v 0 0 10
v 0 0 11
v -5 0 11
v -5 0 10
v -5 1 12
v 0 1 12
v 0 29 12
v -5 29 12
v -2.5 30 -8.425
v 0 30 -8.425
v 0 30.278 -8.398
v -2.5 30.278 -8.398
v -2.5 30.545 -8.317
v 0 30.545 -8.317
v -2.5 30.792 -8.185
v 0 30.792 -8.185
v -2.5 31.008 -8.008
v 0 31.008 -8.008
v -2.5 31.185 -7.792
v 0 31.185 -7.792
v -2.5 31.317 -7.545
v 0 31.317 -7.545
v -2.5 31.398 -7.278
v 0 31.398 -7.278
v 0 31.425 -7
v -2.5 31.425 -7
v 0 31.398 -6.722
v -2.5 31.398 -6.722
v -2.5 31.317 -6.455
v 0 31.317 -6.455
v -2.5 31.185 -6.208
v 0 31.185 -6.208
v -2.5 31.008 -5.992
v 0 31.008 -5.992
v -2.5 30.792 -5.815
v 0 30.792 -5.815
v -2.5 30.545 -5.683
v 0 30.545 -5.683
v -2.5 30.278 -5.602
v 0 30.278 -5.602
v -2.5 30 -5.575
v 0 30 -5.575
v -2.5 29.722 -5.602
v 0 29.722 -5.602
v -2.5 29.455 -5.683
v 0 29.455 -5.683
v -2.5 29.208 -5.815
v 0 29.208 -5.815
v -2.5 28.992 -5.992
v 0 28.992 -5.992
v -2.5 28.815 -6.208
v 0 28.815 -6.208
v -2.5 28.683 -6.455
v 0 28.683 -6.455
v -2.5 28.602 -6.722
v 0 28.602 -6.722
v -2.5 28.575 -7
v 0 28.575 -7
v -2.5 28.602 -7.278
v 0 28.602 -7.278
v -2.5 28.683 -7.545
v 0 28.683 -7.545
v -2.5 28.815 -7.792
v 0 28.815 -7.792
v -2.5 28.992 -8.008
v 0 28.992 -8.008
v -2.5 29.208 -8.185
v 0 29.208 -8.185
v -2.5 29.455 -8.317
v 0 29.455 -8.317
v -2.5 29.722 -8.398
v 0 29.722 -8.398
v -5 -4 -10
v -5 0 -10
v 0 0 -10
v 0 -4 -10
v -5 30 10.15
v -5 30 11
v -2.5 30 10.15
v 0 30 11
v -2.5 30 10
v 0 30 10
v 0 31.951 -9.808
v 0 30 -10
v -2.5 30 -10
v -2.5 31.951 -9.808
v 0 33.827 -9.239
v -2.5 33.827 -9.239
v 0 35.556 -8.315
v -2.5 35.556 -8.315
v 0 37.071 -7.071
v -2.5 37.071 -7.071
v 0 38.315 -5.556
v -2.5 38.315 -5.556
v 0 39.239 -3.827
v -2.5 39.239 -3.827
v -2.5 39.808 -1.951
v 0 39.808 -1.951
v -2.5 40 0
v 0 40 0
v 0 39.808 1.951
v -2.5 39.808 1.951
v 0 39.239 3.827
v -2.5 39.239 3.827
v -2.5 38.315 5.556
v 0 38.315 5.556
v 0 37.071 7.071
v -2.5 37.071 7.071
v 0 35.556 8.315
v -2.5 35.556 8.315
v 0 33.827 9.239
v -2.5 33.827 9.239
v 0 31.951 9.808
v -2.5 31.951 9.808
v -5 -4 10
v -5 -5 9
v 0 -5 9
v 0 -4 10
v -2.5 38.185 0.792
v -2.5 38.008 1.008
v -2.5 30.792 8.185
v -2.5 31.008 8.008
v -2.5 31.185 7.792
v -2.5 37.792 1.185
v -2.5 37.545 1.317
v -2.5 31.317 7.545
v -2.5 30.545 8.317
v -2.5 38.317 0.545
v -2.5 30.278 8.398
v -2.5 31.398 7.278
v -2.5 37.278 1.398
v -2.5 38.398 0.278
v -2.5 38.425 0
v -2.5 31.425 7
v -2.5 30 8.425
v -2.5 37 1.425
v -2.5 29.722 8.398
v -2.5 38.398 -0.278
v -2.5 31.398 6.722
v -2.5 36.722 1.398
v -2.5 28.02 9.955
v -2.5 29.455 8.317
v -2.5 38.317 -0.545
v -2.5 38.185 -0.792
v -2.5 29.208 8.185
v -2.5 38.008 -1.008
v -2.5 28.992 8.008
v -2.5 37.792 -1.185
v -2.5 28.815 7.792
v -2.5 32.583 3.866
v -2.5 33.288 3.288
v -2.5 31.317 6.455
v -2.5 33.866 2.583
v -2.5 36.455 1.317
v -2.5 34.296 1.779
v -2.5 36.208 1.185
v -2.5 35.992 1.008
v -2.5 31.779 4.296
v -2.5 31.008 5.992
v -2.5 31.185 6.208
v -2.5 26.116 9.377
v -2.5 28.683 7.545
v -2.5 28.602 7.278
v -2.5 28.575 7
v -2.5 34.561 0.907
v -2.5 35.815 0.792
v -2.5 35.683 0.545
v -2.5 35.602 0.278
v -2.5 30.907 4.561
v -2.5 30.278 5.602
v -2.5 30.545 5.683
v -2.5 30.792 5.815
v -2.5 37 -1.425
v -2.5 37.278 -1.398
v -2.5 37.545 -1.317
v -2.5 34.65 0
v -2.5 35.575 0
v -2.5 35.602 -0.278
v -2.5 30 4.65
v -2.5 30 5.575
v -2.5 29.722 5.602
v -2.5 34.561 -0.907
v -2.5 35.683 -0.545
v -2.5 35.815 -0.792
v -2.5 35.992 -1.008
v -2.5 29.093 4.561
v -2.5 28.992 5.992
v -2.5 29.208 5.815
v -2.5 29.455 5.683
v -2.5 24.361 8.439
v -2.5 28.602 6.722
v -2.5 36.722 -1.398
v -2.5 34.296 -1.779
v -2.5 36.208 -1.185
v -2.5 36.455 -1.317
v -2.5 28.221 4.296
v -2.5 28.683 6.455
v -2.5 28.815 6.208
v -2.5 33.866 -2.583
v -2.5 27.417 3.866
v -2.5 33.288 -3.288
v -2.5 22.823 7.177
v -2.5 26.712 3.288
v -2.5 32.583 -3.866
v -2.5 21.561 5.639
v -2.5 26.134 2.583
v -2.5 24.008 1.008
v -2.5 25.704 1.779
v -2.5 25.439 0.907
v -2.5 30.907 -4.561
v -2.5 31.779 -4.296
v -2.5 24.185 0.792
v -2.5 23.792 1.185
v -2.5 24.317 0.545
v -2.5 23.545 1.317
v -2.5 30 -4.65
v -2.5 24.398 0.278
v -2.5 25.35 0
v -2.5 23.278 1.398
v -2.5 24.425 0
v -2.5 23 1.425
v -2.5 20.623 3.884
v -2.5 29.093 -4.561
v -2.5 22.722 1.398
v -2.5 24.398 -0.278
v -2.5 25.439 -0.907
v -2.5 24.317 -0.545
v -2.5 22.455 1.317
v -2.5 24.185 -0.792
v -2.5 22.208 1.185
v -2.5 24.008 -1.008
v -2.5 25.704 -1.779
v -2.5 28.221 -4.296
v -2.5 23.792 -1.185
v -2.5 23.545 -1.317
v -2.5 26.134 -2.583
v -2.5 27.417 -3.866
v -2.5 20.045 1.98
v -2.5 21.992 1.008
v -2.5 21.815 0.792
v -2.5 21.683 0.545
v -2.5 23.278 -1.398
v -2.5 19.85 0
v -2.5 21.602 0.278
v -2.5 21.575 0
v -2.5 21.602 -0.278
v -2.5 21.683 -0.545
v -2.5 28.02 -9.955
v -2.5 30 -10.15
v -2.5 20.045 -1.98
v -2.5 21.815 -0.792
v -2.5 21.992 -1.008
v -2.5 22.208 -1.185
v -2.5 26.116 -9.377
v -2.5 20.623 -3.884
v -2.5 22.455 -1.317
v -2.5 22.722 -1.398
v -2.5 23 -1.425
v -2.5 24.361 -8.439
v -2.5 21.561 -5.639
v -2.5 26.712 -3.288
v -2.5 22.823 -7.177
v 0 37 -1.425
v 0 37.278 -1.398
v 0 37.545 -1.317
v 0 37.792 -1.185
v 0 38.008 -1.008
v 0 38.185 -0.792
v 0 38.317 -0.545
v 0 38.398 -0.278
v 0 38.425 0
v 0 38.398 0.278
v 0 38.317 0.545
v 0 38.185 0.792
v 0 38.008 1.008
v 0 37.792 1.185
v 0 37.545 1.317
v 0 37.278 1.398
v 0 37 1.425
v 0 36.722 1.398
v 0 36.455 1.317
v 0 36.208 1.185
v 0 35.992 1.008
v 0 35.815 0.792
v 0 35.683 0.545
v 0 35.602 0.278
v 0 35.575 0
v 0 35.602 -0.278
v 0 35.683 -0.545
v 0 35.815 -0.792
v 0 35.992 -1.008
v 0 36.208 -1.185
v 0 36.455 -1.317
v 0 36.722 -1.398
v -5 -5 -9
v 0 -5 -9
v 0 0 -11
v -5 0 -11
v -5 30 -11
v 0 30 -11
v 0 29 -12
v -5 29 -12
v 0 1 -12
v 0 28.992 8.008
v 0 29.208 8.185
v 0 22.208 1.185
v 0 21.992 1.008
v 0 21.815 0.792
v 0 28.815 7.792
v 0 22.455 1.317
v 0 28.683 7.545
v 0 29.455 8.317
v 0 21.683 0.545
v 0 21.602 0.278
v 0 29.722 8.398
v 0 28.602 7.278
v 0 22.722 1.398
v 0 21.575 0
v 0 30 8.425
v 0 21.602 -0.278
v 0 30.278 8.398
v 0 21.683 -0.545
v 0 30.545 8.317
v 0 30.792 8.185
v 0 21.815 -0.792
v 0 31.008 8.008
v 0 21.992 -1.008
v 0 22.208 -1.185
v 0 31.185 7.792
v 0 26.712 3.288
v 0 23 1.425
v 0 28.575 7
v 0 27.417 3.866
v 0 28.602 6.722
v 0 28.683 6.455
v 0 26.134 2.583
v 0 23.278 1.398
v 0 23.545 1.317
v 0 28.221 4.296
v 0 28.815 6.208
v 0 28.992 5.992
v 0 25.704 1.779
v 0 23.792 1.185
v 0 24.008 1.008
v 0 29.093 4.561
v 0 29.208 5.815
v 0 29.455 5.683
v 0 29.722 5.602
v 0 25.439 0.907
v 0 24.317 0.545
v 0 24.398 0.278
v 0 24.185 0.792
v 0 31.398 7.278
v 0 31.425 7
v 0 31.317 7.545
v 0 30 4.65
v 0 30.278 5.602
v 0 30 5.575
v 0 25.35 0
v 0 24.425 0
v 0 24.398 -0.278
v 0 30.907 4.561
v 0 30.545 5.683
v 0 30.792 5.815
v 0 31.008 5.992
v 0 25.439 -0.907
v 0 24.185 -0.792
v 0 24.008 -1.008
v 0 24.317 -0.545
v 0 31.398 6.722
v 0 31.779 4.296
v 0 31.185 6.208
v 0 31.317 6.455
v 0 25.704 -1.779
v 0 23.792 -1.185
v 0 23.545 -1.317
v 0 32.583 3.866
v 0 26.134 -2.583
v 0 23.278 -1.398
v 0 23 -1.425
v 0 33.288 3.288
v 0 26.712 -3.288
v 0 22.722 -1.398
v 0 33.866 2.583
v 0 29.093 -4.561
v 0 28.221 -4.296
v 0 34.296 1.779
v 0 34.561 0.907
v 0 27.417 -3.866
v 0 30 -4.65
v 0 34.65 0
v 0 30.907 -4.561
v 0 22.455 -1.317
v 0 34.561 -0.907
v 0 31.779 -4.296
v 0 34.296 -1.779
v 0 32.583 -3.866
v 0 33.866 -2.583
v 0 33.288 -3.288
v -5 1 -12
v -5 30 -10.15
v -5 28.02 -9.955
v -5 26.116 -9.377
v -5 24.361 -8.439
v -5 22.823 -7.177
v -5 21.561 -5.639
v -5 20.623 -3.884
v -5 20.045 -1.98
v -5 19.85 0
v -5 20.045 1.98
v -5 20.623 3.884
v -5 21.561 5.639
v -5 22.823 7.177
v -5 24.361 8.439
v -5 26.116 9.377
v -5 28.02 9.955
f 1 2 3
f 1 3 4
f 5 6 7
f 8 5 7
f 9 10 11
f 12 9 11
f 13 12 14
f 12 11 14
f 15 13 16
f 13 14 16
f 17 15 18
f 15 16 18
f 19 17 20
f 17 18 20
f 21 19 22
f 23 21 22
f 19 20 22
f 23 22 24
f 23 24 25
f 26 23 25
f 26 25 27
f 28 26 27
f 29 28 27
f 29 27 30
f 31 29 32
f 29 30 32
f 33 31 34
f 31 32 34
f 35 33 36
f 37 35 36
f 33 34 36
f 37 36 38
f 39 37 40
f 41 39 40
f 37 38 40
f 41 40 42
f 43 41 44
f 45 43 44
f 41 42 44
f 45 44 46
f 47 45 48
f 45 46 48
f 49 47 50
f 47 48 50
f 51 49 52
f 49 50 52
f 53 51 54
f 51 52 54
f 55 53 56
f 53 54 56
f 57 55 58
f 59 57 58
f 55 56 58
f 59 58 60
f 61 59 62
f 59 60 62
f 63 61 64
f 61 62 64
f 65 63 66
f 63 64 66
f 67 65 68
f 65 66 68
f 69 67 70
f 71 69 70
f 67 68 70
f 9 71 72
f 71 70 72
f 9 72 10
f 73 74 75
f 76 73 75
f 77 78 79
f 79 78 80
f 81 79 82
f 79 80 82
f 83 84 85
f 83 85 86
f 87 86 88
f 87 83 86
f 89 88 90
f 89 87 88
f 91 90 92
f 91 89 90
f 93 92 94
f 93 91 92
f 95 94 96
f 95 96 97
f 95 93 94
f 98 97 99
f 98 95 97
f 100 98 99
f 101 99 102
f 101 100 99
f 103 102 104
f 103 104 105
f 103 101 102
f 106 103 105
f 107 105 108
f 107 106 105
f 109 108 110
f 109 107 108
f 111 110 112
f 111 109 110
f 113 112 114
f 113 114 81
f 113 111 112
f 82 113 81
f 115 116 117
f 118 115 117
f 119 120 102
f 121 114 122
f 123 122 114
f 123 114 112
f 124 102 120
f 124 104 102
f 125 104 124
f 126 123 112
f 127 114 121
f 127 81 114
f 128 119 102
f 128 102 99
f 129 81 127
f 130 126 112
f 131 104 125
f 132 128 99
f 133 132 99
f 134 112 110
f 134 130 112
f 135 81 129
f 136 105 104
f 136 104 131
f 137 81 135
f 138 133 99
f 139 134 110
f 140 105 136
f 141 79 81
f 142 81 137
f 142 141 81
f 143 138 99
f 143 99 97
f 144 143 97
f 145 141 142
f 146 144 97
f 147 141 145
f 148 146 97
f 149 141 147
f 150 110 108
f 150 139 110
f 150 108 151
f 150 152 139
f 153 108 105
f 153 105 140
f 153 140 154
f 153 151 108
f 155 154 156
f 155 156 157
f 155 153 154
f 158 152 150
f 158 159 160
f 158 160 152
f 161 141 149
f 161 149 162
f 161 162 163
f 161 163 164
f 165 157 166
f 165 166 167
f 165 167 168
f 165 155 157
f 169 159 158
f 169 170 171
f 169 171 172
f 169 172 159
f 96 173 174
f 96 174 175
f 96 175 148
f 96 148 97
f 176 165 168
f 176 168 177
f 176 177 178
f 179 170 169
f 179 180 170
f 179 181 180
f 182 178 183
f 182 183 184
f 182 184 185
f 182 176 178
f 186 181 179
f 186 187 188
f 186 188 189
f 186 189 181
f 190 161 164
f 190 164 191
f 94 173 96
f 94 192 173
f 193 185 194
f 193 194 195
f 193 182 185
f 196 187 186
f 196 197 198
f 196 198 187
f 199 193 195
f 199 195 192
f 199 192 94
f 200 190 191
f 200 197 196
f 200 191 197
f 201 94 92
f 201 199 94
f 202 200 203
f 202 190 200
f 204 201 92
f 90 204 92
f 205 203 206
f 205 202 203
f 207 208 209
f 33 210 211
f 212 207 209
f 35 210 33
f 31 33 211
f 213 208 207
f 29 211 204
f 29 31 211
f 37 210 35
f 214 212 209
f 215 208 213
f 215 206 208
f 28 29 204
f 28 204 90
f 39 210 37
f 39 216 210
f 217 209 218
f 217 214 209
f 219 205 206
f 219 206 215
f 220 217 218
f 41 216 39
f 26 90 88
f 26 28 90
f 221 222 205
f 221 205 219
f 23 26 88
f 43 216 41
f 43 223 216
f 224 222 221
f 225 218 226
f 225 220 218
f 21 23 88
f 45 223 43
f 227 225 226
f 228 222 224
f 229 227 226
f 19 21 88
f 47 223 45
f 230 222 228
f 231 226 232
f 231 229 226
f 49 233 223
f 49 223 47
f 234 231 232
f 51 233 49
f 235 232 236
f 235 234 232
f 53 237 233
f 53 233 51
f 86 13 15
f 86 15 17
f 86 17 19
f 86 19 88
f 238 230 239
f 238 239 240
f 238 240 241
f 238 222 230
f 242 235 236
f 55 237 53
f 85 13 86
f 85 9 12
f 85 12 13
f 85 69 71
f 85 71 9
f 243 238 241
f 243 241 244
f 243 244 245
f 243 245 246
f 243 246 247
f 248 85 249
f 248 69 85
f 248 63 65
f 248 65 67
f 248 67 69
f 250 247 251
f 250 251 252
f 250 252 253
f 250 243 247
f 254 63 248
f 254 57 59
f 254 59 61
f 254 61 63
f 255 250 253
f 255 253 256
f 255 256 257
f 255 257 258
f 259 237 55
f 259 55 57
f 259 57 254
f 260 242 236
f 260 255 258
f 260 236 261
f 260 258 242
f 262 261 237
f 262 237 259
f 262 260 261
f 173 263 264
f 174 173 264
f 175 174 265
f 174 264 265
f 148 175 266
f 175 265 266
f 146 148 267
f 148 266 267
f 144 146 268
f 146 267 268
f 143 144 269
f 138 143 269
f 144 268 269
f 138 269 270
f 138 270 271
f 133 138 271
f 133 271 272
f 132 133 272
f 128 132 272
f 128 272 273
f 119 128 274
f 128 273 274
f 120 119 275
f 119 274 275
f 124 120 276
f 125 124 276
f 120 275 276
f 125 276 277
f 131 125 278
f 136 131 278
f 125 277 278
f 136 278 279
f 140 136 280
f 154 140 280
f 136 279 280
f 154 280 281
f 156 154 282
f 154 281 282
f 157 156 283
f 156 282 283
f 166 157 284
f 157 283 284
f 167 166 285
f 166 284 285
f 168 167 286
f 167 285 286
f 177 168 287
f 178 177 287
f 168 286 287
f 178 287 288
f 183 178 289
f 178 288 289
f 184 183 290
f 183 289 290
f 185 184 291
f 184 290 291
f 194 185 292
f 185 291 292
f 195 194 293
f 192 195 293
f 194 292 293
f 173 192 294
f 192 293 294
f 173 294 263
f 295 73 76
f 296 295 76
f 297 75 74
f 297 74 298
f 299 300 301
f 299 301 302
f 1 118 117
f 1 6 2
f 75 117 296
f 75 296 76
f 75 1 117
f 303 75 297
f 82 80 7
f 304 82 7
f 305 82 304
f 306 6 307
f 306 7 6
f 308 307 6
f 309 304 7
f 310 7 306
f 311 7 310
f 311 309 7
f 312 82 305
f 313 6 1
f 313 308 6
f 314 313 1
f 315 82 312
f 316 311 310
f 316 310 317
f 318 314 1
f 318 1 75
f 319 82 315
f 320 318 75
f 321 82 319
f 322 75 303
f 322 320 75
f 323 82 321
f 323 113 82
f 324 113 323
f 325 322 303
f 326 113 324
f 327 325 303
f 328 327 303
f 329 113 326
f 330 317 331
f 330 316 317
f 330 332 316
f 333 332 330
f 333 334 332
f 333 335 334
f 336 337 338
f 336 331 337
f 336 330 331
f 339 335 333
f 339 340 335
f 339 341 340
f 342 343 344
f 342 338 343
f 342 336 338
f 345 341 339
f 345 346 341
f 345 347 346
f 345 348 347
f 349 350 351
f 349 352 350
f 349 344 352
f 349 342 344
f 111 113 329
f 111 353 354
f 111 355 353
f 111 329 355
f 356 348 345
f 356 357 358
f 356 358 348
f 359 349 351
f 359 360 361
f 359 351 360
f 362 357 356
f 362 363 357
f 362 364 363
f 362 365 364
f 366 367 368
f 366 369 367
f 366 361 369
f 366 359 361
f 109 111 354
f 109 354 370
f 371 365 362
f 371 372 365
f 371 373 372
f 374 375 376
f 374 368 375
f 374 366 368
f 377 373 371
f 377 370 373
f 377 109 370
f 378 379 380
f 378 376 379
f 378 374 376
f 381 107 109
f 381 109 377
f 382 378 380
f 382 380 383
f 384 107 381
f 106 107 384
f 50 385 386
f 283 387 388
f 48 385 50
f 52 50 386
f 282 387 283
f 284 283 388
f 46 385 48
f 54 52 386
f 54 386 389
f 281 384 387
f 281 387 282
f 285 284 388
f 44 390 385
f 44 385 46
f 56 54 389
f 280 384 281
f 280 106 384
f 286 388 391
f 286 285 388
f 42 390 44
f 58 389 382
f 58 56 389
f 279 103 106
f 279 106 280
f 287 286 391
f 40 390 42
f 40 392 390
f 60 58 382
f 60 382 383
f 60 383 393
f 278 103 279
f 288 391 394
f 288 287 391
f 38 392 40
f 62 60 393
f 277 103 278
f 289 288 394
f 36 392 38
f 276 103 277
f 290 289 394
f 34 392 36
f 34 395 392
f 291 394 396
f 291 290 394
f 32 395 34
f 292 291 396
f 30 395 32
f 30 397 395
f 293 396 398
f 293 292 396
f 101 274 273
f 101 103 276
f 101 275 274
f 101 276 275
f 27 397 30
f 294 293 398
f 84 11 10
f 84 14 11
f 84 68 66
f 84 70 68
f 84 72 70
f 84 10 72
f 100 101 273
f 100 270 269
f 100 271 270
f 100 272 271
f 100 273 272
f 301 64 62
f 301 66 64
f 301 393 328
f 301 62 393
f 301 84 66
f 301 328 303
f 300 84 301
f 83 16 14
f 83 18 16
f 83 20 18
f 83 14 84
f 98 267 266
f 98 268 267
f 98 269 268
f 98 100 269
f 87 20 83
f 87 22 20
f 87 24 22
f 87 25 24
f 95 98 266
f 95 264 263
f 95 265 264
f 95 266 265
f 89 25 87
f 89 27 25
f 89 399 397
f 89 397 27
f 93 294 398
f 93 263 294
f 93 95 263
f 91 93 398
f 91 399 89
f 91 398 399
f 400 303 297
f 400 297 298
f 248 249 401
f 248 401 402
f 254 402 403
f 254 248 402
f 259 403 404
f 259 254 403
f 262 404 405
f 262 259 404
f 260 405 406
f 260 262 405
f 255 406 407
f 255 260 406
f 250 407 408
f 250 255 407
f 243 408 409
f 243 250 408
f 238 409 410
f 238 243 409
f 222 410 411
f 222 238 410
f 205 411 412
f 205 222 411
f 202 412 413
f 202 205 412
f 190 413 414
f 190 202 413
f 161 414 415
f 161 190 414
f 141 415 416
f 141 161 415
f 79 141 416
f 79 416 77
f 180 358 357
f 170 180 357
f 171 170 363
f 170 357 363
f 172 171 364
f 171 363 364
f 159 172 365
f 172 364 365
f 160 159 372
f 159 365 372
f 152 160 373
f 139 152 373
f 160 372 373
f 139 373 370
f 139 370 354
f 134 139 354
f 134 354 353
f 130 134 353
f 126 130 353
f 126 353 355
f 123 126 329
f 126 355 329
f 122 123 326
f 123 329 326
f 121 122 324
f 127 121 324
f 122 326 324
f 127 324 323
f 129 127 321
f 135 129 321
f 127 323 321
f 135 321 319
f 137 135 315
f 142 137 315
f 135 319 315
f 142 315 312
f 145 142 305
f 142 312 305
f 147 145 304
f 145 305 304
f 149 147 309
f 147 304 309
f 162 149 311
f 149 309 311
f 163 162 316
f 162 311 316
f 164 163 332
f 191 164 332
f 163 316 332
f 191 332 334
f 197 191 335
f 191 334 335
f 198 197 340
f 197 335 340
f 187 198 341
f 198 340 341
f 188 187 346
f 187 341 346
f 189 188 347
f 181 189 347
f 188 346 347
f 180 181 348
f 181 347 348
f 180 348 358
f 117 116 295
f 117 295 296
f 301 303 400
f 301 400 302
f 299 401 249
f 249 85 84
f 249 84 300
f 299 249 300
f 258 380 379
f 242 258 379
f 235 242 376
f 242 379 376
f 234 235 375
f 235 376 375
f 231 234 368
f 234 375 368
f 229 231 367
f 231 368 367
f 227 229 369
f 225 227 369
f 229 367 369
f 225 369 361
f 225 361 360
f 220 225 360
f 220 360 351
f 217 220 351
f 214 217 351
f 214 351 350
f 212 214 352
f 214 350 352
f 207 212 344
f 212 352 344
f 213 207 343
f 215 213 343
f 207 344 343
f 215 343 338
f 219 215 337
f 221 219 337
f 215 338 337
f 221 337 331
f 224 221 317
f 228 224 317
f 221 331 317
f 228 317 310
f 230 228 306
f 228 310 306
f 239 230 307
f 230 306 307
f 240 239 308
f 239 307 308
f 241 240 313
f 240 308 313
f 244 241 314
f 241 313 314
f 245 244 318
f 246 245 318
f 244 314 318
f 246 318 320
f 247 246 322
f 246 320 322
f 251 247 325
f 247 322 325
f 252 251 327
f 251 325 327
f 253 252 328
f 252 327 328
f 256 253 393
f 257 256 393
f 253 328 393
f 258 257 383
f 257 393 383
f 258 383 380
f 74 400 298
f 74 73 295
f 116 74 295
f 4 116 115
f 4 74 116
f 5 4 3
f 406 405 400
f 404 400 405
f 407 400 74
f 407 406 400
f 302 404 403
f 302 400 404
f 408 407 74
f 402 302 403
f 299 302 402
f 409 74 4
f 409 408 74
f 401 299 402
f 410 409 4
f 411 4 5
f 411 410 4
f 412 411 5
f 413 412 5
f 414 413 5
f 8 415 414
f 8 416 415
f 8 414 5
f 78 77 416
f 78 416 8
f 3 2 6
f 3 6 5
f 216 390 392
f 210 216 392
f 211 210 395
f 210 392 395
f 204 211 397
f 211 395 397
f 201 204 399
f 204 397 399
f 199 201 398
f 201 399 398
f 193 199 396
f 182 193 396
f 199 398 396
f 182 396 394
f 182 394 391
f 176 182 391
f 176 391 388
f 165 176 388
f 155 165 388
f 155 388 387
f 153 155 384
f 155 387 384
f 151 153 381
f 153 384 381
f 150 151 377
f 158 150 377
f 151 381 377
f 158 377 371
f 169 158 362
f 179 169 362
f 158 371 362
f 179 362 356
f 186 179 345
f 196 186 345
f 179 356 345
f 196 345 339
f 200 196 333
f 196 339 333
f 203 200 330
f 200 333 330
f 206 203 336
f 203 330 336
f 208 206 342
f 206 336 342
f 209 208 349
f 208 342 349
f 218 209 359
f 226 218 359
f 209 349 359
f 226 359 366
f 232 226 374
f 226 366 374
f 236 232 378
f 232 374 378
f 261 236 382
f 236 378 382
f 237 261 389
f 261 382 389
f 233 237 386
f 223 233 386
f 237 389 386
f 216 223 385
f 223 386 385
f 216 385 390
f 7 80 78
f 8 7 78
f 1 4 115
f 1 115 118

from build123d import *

# Parameters (mm, degrees)
SKETCH1_R                = 10
SKETCH1_R_2              = 4.5
SKETCH1_R_3              = 1.275
BOSS_EXTRUDE1_DEPTH      = 2.5
BOSS_EXTRUDE3_DEPTH      = 5
SKETCH2_W                = 5
SKETCH2_H                = 20
BOSS_EXTRUDE4_DEPTH      = 5
BOSS_EXTRUDE5_REACH      = 43.533
SKETCH3_W                = 2
SKETCH3_H                = 30
CHAMFER1_SIZE            = 1
CHAMFER2_SIZE            = 1
OFFSET_FOR_3D_PRINT_BY   = 0.15
OFFSET_FOR_3D_PRINT_2_BY = 0.15
OFFSET_FOR_3D_PRINT_3_BY = 0.15
OFFSET_FOR_3D_PRINT_4_BY = 0.15
OFFSET_FOR_3D_PRINT_5_BY = 0.15
OFFSET_FOR_3D_PRINT_6_BY = 0.15


with BuildPart() as part:
    # Sketch1 → Boss-Extrude1 (new body)
    with BuildSketch(Plane(origin=(0, 0, 0), x_dir=(0, 0, -1), z_dir=(1, 0, 0))):
        with Locations((0, 30)):
            Circle(SKETCH1_R)
        with Locations((0, 30)):
            Circle(SKETCH1_R_2, mode=Mode.SUBTRACT)
        with Locations((7, 30)):
            Circle(SKETCH1_R_3, mode=Mode.SUBTRACT)
        with Locations((0, 23)):
            Circle(SKETCH1_R_3, mode=Mode.SUBTRACT)
        with Locations((-7, 30)):
            Circle(SKETCH1_R_3, mode=Mode.SUBTRACT)
        with Locations((0, 37)):
            Circle(SKETCH1_R_3, mode=Mode.SUBTRACT)
    extrude(amount=-BOSS_EXTRUDE1_DEPTH)

    # Sketch1<6> → Boss-Extrude3 (add)
    with BuildSketch(Plane(origin=(0, 0, 0), x_dir=(0, 0, -1), z_dir=(1, 0, 0))):
        with BuildLine():
            ThreePointArc((10, 30), (0, 20), (-10, 30))
            Line((-10, 30), (-10, 0))
            Line((-10, 0), (10, 0))
            Line((10, 0), (10, 30))
        make_face()
    extrude(amount=-BOSS_EXTRUDE3_DEPTH)


with BuildPart() as body_2:
    # Sketch2 → Boss-Extrude4 (new body)
    with BuildSketch(Plane.XZ):
        with Locations((-2.5, 0)):
            Rectangle(SKETCH2_W, SKETCH2_H)
    extrude(amount=BOSS_EXTRUDE4_DEPTH)


with BuildPart() as part_1:
    add(part.part)

    # Combine2: union body 2
    add(body_2.part)

    # Boss-Extrude5: up to this face of the body (flat: up to its plane)
    boss_extrude5_end = Plane(part_1.part.faces().sort_by_distance((-5, 8.664765534, 0))[0])
    # Sketch3 → Boss-Extrude5 (add, up to the picked face)
    with BuildSketch(Plane(origin=(0, 0, 0), x_dir=(0, 0, -1), z_dir=(1, 0, 0)), mode=Mode.PRIVATE) as boss_extrude5_sk1:
        with Locations((11, 15)):
            Rectangle(SKETCH3_W, SKETCH3_H)
    boss_extrude5_tool1 = split(extrude(boss_extrude5_sk1.sketch, amount=-BOSS_EXTRUDE5_REACH, mode=Mode.PRIVATE), bisect_by=boss_extrude5_end, keep=Keep.BOTH, mode=Mode.PRIVATE)
    # Sketch3 → Boss-Extrude5 (add, up to the picked face)
    with BuildSketch(Plane(origin=(0, 0, 0), x_dir=(0, 0, -1), z_dir=(1, 0, 0)), mode=Mode.PRIVATE) as boss_extrude5_sk2:
        with Locations((-11, 15)):
            Rectangle(SKETCH3_W, SKETCH3_H)
    boss_extrude5_tool2 = split(extrude(boss_extrude5_sk2.sketch, amount=-BOSS_EXTRUDE5_REACH, mode=Mode.PRIVATE), bisect_by=boss_extrude5_end, keep=Keep.BOTH, mode=Mode.PRIVATE)
    add(boss_extrude5_tool1.solids().sort_by(Axis((0, 15, -11), (-1, 0, 0)))[0])
    add(boss_extrude5_tool2.solids().sort_by(Axis((0, 15, 11), (-1, 0, 0)))[0])

    # Chamfer1
    chamfer1_edges = [part_1.edges().sort_by_distance(p)[0] for p in [
        (-2.5, 0, -12),
        (-2.5, 30, -12),
        (-2.5, 30, 12),
        (-2.5, 0, 12),
    ]]
    chamfer(chamfer1_edges, length=CHAMFER1_SIZE)

    # Chamfer2
    chamfer2_edges = [part_1.edges().sort_by_distance(p)[0] for p in [
        (-2.5, -5, -10),
        (-2.5, -5, 10),
    ]]
    chamfer(chamfer2_edges, length=CHAMFER2_SIZE)

    # Offset for 3D print: a curved face moved inward by 0.15
    add(Solid.thicken(part_1.faces().sort_by_distance((-3.75, 20, 0))[0], -OFFSET_FOR_3D_PRINT_BY), mode=Mode.SUBTRACT)

    # Offset for 3D print 2: a curved face moved inward by 0.15
    add(Solid.thicken(part_1.faces().sort_by_distance((-1.25, 37, 1.275))[0], -OFFSET_FOR_3D_PRINT_2_BY), mode=Mode.SUBTRACT)

    # Offset for 3D print 3: a curved face moved inward by 0.15
    add(Solid.thicken(part_1.faces().sort_by_distance((-1.25, 23, 1.275))[0], -OFFSET_FOR_3D_PRINT_3_BY), mode=Mode.SUBTRACT)

    # Offset for 3D print 4: a curved face moved inward by 0.15
    add(Solid.thicken(part_1.faces().sort_by_distance((-1.25, 30, -5.725))[0], -OFFSET_FOR_3D_PRINT_4_BY), mode=Mode.SUBTRACT)

    # Offset for 3D print 5: a curved face moved inward by 0.15
    add(Solid.thicken(part_1.faces().sort_by_distance((-1.25, 30, 8.275))[0], -OFFSET_FOR_3D_PRINT_5_BY), mode=Mode.SUBTRACT)

    # Offset for 3D print 6: a curved face moved inward by 0.15
    add(Solid.thicken(part_1.faces().sort_by_distance((-1.25, 30, 4.5))[0], -OFFSET_FOR_3D_PRINT_6_BY), mode=Mode.SUBTRACT)


solid = part_1.part
